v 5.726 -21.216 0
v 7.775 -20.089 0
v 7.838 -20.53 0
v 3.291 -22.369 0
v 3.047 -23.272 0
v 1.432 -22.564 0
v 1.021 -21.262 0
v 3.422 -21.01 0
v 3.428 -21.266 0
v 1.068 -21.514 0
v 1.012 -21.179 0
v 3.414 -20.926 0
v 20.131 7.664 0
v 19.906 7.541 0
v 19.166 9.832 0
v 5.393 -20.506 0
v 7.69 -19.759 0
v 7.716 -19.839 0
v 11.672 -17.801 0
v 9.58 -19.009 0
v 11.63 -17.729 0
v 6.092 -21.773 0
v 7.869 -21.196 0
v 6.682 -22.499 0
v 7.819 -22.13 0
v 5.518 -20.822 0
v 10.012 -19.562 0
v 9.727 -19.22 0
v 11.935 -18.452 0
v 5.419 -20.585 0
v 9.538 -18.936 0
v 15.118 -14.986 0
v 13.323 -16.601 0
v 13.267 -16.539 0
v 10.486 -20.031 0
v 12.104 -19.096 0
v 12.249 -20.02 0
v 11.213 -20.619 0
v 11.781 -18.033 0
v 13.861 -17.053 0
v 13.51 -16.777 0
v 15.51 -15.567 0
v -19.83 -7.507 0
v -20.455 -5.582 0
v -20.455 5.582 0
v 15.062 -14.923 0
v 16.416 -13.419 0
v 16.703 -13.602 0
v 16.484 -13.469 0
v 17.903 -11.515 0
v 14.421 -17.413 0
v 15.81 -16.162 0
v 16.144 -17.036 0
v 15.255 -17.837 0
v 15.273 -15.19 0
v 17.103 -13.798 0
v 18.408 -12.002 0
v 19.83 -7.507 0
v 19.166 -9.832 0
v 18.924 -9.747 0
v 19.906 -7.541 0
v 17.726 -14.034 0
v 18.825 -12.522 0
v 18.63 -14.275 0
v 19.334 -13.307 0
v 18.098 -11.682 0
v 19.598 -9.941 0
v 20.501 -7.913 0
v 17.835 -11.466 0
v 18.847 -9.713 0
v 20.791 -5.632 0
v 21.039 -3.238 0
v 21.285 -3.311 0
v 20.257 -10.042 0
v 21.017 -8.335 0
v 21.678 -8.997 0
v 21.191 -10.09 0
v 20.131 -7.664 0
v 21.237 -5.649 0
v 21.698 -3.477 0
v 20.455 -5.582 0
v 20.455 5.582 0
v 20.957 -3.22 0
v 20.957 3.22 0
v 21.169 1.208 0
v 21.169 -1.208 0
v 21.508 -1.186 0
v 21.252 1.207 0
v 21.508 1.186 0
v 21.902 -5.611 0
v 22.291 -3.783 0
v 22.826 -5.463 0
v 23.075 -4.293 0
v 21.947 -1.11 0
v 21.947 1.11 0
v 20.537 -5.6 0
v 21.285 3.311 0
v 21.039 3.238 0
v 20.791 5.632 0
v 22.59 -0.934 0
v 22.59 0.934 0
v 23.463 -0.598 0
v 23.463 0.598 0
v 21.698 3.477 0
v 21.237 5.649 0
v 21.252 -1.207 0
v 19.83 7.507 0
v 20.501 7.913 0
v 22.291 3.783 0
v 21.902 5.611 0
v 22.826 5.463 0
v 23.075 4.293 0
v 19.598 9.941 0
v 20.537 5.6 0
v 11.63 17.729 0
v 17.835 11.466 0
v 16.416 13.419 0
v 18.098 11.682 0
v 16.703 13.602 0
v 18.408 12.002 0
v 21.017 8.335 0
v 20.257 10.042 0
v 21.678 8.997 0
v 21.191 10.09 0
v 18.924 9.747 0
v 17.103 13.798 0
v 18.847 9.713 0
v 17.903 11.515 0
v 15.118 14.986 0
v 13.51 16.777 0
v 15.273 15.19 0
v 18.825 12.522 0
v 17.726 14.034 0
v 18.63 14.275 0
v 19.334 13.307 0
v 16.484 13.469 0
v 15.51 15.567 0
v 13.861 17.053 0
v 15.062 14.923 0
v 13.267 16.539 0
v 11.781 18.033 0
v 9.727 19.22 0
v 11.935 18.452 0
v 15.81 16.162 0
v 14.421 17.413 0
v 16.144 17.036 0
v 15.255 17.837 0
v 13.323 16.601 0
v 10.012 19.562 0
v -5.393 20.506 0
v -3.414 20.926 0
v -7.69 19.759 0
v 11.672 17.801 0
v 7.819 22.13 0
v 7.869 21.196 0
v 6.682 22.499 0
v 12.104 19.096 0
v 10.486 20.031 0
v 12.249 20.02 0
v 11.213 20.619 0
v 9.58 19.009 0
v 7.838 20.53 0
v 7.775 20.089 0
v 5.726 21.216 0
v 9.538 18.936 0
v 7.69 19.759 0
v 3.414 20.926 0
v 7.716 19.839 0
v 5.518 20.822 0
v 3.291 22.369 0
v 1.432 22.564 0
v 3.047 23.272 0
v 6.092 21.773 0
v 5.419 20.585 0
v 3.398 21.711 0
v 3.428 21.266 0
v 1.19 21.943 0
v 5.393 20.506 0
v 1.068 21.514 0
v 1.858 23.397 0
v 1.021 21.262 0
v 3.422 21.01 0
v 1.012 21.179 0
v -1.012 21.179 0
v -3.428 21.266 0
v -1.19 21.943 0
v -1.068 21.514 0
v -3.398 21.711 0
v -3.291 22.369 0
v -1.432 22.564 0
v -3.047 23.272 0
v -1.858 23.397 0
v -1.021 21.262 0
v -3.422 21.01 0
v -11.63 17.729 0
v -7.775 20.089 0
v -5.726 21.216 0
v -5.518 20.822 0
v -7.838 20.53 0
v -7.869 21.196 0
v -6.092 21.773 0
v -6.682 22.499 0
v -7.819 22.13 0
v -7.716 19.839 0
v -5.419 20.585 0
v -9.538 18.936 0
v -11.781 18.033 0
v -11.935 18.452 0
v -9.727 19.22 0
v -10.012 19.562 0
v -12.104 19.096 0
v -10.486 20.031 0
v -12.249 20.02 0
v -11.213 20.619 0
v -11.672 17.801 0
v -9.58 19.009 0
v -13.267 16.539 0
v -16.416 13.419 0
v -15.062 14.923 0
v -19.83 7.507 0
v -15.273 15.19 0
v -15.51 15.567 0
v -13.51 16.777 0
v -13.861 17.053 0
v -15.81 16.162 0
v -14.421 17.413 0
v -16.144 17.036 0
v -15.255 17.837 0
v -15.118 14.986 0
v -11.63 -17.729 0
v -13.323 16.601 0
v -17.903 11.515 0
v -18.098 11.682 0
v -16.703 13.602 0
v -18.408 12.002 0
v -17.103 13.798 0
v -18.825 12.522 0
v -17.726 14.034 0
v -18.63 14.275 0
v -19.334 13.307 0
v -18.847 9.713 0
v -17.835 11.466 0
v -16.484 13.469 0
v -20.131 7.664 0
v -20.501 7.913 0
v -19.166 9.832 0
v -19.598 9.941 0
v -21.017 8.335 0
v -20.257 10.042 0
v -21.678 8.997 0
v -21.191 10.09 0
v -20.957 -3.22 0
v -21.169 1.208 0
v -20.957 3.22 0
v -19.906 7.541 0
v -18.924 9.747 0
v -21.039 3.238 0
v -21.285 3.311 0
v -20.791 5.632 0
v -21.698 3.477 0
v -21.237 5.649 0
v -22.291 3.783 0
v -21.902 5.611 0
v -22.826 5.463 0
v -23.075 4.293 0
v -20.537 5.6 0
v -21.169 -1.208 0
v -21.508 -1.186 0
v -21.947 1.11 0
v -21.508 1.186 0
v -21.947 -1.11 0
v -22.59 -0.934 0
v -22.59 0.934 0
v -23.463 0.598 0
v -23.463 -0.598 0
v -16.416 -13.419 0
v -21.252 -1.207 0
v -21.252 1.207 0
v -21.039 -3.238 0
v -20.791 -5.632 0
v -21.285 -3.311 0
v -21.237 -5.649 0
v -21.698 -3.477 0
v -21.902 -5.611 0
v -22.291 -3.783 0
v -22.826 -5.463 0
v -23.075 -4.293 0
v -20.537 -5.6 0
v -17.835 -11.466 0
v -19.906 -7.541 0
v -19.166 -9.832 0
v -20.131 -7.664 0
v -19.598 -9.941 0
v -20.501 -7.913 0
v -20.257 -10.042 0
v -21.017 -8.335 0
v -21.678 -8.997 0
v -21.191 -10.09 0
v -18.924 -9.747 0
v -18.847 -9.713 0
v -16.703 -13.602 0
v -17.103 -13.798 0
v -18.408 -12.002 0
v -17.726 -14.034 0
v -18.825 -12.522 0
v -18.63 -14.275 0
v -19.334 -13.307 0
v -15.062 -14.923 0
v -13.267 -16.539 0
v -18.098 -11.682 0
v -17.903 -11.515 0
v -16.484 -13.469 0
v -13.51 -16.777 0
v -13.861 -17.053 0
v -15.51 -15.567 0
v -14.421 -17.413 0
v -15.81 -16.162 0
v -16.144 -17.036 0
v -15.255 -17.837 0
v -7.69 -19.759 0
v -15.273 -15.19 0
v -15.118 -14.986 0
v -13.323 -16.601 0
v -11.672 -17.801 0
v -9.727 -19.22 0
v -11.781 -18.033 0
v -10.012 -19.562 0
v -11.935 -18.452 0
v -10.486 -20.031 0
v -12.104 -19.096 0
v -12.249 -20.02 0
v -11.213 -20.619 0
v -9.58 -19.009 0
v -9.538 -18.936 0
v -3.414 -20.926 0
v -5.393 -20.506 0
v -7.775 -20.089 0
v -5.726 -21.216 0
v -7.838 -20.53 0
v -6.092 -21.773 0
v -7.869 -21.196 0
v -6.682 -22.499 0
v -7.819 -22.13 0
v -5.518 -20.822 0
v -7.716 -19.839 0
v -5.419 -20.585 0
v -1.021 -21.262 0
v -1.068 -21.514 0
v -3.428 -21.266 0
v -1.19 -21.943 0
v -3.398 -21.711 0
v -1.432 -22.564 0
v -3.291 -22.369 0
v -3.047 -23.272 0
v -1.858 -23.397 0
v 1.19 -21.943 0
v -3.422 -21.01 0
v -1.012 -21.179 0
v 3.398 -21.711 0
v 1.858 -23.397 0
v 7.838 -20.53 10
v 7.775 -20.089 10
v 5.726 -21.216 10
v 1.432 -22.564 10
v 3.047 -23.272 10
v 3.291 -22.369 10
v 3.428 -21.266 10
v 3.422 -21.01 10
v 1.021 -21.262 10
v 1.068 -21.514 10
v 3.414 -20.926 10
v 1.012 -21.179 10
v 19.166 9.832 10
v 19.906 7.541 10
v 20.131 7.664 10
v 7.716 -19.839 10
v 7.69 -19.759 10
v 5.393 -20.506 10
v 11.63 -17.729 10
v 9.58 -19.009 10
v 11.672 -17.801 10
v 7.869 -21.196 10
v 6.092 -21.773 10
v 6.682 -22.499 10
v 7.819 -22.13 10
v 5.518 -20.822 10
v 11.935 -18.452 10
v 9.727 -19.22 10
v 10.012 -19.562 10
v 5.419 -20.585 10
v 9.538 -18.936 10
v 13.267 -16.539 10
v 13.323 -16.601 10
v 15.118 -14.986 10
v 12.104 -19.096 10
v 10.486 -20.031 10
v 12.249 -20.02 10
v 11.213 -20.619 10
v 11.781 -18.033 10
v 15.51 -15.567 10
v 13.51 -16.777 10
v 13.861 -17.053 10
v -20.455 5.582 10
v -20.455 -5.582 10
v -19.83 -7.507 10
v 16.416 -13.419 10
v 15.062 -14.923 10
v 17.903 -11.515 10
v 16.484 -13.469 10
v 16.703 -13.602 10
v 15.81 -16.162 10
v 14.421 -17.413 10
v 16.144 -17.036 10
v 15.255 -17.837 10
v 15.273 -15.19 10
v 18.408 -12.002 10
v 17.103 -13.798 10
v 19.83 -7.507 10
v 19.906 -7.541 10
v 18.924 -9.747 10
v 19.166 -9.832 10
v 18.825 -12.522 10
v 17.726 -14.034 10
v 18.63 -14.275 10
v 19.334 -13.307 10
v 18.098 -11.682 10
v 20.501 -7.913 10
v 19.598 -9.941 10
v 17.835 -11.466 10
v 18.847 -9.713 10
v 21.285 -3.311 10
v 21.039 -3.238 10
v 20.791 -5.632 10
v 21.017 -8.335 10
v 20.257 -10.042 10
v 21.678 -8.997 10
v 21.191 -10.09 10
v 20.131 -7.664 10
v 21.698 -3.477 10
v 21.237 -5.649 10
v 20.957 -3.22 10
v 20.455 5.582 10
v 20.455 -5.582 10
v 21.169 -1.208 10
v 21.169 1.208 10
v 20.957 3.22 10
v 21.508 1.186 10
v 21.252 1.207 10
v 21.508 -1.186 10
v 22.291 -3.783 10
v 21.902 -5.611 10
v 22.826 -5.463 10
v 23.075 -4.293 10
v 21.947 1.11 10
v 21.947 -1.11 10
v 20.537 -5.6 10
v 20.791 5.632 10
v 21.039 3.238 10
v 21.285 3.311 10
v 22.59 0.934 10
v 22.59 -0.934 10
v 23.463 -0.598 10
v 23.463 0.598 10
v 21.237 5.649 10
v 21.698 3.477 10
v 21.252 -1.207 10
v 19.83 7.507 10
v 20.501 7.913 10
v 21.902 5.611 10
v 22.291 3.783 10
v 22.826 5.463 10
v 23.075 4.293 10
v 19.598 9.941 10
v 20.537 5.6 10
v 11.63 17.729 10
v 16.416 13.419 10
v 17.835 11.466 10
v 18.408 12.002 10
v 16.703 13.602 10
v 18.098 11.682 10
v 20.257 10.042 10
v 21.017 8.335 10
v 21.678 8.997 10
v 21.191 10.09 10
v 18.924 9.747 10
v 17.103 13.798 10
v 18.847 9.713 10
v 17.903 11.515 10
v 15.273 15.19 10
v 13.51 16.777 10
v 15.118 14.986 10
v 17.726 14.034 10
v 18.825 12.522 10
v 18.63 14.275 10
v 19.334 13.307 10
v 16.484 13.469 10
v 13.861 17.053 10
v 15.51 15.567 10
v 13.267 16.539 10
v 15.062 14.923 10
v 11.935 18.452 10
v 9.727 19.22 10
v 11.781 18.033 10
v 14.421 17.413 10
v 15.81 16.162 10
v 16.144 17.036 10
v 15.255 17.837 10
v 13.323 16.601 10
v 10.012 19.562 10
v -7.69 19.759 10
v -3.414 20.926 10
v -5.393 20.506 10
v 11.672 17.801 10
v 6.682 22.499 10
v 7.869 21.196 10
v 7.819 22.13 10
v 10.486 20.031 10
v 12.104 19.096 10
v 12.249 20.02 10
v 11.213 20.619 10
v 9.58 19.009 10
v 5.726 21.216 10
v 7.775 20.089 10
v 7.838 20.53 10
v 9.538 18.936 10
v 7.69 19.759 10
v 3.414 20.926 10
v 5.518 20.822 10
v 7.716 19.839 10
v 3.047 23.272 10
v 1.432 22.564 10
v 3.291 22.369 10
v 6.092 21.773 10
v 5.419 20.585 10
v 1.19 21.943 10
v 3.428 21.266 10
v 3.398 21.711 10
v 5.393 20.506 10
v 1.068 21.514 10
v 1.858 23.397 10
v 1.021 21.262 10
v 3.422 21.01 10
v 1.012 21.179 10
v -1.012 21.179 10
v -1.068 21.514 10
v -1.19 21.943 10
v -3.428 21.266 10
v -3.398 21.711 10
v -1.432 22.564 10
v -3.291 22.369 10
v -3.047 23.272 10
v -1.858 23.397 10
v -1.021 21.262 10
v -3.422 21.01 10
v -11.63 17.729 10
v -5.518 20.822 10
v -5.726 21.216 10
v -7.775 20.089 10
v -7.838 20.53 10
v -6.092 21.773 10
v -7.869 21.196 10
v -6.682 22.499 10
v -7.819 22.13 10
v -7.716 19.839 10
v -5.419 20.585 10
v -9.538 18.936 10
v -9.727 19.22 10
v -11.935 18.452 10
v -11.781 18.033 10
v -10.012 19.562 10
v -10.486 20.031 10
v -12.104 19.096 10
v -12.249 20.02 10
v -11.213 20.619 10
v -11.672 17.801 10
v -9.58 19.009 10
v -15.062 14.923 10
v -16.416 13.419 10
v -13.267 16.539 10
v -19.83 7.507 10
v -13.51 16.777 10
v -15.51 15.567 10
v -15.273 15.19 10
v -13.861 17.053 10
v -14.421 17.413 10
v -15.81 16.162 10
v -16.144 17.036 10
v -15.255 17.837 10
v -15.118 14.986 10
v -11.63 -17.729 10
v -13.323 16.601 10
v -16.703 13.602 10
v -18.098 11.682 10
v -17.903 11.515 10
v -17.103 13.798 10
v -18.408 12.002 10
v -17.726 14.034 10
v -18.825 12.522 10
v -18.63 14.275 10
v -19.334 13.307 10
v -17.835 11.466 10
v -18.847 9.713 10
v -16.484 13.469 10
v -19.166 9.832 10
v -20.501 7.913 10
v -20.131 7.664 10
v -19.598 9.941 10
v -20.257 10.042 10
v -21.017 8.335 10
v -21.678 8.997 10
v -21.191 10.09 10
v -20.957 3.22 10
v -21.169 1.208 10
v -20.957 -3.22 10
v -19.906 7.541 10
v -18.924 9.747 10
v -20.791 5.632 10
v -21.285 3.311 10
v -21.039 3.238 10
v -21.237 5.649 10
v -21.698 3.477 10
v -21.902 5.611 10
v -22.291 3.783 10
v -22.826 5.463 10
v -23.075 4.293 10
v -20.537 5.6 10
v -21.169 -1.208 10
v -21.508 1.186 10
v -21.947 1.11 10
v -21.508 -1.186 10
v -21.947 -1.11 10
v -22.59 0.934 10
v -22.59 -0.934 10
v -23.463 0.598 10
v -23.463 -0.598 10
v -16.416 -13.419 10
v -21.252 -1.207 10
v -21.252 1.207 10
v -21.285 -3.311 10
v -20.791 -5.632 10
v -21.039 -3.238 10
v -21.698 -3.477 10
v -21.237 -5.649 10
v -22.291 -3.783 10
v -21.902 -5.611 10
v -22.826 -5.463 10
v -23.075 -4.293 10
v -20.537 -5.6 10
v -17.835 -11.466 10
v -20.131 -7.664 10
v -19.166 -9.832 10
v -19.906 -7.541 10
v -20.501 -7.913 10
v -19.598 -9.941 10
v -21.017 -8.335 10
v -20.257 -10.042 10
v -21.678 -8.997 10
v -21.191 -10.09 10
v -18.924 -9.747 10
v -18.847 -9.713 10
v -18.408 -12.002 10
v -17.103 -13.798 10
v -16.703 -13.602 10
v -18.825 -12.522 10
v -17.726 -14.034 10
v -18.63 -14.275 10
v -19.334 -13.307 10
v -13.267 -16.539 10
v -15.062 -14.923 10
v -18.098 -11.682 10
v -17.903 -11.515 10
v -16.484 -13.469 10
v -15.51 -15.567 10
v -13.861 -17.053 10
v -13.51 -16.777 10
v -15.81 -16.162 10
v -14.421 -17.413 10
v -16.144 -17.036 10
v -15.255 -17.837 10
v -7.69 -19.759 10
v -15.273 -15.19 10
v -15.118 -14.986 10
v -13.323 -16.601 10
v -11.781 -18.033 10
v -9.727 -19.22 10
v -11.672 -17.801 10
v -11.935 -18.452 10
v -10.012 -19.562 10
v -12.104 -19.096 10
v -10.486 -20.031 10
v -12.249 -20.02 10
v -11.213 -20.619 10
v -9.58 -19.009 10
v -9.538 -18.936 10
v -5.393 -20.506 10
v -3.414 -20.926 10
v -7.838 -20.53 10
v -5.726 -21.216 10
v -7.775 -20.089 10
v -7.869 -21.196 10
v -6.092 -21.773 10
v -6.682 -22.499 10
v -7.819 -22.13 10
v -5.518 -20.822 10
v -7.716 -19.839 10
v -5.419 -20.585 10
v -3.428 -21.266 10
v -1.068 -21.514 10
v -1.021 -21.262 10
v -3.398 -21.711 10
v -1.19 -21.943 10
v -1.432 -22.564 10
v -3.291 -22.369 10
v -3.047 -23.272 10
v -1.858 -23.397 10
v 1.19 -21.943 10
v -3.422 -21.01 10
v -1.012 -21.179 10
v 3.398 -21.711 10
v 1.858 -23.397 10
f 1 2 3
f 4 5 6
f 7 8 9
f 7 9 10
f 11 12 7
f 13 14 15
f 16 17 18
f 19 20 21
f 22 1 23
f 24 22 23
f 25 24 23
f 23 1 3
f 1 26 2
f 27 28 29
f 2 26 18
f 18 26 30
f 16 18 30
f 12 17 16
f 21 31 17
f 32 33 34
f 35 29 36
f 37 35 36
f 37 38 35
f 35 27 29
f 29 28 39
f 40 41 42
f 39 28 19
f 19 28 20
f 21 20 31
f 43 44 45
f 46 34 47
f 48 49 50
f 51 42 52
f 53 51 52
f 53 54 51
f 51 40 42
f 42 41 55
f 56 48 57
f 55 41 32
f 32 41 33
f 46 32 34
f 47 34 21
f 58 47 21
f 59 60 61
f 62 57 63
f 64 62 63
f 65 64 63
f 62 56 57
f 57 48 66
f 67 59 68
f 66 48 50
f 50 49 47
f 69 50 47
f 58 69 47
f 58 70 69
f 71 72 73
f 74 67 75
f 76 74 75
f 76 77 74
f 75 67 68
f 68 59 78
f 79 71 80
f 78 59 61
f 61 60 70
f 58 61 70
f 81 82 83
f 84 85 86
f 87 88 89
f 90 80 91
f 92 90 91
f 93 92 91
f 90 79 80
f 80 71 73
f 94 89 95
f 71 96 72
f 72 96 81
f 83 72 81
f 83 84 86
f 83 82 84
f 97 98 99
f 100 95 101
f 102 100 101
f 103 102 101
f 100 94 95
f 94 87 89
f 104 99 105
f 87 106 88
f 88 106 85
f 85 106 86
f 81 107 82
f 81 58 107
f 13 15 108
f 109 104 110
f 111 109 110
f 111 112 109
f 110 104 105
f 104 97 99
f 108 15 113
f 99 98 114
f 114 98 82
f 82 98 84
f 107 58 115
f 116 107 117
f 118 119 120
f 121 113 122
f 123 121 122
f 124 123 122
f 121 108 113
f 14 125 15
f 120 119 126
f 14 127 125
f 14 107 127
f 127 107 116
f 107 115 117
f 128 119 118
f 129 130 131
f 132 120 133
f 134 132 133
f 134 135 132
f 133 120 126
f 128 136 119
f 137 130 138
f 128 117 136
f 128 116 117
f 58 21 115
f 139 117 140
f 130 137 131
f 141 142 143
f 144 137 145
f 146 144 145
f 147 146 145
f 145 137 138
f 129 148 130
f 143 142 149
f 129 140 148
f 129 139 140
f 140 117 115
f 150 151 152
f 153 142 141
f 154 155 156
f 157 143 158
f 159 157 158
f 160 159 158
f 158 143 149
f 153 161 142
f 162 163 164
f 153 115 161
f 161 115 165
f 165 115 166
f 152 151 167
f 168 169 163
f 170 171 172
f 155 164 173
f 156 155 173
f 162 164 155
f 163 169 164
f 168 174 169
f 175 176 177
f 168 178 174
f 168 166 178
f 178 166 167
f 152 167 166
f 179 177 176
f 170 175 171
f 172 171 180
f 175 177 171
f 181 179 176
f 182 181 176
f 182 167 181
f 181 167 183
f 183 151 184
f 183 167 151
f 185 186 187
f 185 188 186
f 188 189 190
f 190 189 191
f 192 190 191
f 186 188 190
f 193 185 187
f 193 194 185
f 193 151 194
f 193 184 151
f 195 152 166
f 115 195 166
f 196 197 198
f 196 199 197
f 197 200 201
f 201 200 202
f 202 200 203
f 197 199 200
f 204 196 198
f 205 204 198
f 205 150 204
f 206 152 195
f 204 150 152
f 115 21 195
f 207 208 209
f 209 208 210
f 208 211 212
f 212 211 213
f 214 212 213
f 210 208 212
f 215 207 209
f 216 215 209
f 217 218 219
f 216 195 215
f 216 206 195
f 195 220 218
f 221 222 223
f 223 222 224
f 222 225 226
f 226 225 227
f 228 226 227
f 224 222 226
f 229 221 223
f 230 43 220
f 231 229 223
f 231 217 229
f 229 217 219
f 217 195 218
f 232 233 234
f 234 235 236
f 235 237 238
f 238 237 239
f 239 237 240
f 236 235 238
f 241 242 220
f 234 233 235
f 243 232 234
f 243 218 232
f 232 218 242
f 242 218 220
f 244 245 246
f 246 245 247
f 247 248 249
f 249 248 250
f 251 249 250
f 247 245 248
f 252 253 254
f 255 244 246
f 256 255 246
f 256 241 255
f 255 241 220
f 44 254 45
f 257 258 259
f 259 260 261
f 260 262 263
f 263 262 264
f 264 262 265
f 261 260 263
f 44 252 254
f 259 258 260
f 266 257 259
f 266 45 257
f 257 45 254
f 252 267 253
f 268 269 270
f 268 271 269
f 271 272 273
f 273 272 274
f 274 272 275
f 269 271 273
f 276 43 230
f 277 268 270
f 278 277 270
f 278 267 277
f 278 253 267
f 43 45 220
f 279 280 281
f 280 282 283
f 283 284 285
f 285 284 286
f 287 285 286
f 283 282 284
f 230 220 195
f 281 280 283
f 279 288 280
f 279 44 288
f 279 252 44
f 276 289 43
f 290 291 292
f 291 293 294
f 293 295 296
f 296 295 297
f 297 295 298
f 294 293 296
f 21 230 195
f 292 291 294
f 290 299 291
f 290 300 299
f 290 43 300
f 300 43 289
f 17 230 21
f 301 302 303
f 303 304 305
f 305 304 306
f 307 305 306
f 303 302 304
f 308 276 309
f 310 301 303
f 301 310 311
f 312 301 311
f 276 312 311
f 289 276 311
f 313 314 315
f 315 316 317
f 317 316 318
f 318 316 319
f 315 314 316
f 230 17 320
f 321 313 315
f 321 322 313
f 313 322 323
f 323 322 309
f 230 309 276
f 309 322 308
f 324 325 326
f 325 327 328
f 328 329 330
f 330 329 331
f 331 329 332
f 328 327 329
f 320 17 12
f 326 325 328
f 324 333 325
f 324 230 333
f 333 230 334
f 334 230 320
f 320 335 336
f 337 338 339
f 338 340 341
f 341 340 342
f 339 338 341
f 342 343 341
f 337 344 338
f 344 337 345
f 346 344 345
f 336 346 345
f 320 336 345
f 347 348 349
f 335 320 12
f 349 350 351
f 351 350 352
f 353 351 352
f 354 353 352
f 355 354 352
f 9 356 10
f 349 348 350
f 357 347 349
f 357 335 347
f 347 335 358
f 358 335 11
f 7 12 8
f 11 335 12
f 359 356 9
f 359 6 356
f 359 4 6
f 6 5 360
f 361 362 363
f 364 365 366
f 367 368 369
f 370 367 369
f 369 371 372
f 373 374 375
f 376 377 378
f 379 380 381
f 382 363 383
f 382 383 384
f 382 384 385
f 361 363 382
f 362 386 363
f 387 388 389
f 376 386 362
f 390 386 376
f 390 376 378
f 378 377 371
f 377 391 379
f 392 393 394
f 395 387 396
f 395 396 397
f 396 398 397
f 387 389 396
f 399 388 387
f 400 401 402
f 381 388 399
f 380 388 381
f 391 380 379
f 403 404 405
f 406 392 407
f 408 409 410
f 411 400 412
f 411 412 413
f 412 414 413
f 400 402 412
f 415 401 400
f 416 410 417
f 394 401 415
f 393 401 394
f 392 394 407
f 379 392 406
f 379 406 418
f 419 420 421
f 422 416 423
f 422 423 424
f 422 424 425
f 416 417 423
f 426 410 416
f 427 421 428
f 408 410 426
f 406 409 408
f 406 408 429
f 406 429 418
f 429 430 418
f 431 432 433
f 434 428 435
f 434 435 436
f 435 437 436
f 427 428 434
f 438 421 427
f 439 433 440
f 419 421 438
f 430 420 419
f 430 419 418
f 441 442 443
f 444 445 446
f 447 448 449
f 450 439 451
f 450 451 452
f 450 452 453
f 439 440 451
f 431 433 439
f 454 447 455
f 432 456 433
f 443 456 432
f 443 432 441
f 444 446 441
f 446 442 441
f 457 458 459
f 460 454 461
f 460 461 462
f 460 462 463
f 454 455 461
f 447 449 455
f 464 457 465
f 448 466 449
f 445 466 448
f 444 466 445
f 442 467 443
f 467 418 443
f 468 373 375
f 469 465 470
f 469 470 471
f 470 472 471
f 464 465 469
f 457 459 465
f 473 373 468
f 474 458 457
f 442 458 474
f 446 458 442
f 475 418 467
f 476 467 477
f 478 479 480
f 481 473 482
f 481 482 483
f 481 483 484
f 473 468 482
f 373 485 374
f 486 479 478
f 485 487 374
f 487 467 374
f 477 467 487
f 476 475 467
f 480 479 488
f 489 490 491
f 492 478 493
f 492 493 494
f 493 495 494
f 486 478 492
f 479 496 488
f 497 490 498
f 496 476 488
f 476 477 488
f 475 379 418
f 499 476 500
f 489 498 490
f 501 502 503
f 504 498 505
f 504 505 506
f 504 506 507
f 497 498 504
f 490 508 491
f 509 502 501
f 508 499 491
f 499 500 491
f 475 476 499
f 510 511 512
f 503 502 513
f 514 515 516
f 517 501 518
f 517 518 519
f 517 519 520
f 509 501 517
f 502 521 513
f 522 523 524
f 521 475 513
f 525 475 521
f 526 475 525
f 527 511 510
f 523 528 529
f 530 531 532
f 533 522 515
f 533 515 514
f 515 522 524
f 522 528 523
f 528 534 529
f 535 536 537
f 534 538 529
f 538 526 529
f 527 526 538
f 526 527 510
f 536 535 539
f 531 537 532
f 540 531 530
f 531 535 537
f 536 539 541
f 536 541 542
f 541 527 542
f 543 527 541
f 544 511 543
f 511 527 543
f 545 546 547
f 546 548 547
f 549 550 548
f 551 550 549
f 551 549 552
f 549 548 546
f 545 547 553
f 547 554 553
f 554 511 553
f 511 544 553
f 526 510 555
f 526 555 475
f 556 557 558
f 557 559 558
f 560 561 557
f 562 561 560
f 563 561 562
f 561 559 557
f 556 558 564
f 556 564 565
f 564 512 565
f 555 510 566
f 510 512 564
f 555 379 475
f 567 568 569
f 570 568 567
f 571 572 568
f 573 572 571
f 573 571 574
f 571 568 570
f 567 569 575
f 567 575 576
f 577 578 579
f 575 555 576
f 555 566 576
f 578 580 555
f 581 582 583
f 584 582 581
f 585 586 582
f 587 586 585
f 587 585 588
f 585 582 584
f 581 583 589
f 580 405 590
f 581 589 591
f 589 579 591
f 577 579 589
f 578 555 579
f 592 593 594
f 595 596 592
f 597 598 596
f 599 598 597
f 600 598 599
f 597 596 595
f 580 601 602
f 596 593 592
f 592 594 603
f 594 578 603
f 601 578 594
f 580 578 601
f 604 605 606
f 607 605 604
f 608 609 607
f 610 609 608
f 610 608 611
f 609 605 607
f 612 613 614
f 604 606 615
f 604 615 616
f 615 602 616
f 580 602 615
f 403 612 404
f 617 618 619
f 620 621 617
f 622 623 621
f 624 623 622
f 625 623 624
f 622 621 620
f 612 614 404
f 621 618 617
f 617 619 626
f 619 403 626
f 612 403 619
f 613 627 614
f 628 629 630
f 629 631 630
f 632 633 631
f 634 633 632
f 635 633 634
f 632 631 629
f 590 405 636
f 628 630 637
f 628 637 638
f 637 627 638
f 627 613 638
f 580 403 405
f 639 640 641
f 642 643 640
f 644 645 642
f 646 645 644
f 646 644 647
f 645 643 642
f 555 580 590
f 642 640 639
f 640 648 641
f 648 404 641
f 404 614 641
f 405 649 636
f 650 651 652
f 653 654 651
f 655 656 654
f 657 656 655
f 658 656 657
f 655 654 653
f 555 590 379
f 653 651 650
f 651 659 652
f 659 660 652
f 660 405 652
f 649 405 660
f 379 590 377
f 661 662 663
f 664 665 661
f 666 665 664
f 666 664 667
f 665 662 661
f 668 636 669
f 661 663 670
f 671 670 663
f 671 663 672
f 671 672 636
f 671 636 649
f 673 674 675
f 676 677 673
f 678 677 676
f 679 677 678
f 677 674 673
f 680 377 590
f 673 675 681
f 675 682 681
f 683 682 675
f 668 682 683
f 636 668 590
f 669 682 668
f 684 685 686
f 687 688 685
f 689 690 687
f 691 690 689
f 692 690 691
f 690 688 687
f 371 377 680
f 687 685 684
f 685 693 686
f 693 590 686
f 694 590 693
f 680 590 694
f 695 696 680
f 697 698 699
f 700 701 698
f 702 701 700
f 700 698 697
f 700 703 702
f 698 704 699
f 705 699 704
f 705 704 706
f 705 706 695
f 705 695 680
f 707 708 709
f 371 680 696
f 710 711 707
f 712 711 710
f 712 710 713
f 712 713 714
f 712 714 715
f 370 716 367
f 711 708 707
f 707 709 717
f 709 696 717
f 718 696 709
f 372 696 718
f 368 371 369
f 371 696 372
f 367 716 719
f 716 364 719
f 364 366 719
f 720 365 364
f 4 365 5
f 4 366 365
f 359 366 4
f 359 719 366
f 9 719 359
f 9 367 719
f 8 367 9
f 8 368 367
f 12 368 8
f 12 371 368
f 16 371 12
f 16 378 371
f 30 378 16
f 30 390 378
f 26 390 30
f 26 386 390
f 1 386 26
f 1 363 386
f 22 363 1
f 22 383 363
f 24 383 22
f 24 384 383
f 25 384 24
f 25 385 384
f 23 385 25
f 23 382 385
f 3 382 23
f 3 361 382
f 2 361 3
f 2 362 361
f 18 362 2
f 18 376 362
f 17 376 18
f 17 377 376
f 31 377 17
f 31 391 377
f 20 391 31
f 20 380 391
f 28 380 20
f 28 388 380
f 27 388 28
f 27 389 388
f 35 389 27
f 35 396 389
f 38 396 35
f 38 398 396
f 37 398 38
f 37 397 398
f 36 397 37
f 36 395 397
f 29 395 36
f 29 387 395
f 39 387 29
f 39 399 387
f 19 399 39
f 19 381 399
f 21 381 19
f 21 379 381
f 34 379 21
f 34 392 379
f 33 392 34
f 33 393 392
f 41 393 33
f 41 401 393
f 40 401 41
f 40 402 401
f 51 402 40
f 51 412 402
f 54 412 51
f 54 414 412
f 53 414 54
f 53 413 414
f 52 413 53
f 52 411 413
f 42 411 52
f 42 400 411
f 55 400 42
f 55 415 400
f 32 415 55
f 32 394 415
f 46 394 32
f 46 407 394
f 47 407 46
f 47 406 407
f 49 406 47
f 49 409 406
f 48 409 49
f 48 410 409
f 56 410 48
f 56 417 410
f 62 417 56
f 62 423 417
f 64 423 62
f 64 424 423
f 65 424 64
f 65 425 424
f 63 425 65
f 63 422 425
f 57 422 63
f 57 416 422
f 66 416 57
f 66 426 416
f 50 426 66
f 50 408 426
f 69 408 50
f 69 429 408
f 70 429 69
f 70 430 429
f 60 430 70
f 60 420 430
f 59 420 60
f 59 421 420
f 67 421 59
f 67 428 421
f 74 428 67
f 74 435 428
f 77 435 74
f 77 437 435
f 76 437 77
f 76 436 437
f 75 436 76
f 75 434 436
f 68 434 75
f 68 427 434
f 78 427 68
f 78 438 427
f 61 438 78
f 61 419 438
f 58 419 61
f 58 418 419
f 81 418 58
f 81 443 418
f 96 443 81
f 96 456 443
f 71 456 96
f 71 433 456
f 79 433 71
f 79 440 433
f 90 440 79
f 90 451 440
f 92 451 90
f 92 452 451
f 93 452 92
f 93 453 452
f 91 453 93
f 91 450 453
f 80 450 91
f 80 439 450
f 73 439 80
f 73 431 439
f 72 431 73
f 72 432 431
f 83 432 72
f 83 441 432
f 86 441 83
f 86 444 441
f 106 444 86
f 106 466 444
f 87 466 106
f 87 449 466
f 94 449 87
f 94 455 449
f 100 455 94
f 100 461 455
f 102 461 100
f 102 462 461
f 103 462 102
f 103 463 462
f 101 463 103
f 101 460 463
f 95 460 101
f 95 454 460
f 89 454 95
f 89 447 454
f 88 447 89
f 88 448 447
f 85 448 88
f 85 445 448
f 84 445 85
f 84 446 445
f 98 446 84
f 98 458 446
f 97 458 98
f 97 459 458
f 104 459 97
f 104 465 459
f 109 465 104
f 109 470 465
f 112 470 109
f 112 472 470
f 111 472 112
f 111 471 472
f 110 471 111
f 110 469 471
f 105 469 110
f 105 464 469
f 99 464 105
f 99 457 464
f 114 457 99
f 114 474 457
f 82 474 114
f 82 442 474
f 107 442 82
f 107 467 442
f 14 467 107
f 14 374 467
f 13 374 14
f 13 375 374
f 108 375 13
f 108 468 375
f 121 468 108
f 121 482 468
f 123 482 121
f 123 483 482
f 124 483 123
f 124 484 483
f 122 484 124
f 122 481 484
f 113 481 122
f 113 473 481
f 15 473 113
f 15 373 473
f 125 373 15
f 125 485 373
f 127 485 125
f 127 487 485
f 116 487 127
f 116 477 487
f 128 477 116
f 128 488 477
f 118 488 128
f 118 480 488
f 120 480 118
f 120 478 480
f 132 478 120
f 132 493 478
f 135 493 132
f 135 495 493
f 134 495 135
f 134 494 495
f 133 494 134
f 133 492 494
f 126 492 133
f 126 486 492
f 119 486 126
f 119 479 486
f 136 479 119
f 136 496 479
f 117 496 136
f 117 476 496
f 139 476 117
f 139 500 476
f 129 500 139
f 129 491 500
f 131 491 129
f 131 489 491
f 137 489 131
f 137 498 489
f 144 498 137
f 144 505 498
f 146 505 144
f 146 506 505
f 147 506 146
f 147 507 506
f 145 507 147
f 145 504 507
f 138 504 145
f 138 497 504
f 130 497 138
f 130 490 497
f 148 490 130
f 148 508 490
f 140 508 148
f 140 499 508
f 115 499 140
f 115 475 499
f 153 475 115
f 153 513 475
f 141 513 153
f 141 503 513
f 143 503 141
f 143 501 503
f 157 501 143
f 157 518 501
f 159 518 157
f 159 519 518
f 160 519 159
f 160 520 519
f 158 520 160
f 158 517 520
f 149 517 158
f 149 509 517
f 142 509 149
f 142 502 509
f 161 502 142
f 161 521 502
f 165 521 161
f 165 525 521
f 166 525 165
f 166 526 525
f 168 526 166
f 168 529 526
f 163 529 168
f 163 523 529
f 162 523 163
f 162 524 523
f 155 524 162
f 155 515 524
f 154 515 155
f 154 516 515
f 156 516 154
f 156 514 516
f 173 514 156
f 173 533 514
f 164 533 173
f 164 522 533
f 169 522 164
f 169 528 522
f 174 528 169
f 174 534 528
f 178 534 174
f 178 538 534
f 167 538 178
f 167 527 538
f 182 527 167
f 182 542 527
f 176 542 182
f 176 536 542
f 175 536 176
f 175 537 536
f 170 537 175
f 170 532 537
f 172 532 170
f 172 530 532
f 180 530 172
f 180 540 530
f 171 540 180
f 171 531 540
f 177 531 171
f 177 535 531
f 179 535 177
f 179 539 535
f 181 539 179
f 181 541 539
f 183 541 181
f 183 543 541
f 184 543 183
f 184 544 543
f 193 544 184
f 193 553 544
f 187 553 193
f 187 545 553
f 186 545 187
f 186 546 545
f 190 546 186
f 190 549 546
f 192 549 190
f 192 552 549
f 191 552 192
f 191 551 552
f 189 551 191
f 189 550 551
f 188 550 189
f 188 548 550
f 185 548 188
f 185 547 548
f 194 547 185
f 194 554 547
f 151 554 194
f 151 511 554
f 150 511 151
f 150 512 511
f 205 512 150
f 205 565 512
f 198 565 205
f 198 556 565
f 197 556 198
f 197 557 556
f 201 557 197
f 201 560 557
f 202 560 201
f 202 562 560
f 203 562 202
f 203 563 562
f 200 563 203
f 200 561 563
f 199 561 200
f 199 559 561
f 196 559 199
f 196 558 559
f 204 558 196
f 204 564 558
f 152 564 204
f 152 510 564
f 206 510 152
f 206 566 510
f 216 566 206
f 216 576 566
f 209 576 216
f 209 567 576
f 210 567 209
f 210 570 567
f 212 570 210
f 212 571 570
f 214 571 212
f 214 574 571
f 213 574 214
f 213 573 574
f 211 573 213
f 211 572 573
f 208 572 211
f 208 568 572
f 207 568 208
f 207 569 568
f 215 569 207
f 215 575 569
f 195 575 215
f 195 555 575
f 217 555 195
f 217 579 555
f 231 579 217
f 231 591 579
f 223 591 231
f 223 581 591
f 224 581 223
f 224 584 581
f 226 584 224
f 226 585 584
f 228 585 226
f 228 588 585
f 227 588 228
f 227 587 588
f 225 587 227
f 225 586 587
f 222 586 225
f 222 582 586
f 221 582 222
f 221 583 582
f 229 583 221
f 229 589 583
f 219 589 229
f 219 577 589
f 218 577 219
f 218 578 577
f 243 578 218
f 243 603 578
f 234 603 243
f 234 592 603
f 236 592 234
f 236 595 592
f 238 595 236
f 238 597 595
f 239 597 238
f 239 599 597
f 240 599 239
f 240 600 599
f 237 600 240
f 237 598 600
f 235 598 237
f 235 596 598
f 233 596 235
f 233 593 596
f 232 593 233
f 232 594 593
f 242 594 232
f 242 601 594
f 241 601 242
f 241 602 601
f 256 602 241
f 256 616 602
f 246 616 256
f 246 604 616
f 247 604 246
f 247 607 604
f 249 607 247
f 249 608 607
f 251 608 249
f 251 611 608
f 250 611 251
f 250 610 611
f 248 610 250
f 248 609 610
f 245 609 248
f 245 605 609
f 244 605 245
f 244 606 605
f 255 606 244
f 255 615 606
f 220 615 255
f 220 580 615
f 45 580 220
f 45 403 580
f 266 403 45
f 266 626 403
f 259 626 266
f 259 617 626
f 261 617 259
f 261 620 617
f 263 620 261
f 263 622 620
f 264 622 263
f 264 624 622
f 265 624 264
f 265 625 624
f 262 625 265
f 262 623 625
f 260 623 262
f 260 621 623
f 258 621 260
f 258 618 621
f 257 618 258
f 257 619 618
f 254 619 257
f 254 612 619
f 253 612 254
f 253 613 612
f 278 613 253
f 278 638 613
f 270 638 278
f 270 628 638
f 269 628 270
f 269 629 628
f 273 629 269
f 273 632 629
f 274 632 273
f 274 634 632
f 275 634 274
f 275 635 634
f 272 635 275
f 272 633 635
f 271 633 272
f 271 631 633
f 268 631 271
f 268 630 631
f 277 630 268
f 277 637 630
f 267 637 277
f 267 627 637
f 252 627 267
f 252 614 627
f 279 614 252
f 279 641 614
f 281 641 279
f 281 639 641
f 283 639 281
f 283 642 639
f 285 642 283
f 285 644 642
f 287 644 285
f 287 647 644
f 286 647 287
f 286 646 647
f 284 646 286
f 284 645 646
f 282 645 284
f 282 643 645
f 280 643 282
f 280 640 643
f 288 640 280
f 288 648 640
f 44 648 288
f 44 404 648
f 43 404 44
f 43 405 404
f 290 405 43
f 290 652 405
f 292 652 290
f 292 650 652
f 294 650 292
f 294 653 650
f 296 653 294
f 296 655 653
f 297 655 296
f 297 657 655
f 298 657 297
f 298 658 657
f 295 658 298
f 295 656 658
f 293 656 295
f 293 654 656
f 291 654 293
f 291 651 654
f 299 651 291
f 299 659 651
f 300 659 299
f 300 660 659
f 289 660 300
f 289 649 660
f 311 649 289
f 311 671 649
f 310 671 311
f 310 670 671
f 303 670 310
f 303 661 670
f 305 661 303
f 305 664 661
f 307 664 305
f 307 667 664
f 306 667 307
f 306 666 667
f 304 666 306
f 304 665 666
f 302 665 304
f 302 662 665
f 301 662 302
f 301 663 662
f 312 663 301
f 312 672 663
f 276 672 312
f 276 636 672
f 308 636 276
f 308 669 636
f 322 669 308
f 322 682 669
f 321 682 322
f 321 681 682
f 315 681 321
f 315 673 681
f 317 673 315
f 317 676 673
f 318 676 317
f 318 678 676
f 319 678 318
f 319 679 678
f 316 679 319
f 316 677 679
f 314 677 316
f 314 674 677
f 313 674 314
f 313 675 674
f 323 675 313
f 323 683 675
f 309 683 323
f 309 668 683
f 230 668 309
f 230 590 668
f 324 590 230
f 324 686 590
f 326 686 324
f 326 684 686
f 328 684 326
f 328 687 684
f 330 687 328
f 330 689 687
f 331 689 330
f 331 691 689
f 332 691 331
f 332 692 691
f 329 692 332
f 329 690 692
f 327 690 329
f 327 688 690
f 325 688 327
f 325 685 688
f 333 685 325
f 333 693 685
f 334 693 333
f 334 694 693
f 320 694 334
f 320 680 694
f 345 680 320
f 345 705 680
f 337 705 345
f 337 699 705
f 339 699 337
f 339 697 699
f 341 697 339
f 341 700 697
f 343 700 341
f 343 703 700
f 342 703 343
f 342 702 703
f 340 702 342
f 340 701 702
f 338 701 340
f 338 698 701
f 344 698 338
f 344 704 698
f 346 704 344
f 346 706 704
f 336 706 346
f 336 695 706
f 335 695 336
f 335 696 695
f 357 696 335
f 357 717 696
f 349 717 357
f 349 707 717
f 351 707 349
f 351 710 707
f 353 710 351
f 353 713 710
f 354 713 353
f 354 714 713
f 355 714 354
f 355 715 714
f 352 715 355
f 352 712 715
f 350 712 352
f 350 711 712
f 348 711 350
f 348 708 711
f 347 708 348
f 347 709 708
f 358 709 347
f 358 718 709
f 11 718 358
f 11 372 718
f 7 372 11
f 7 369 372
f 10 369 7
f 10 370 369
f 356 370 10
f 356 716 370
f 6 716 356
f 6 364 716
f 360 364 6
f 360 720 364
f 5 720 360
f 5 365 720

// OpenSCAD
// Simple involute gear library
// RehelixK 2017

/* [ Global ] */

// Diameter of gear (mm) - specify pitch or diameter not both
d=0;

// Pitch (per inch diameter, i.e. 1 inch diameter would hahelixe this many teeth)
p=0;

// Number of teeth
n=30;

// Example 2nd gear teeth
n2=0;

// Example 3rd gear teeth
n3=0;

// Example 4th gear teeth
n4=0;

// Gear height (mm)
h=10;

// Helix
helix=0; // [-3,-2,-1,0,1,2,3]

// Chamfer edges
chamfer=0; // [0,1]

// Spindle radius
spindle=0;

// Diameter of hole
hole=0;

// Width (wrench size) of nut
nut=0;

// Spokes
spokes=0;

// Hollow out
hollow=0; // [0,1]

/* [ Tweaks ] */

// Wall (for spokes, hollow, etc)
wall=2;

// Dedendum (mm) - half height of teeth (0 for based on pitch)
b=0;

// Tolerance for print clearances (mm)
t=0.15;

// steps for each side of tooth - more for smoother
s=5;

// Circular parts steps
fn=100;

gear_example(n1=n,n2=n2,n3=n3,n4=n4,d=d,p=p,b=b,s=s,t=t,h=h,helix=helix,chamfer=chamfer,spindle=spindle,hole=hole,nut=nut,spokes=spokes,hollow=hollow,wall=wall,fn=fn);

//translate([-gear_diameter(39,17)/2,0,0])gear_chamfer(n=39,p=17,h=10,m=3);
//translate([gear_diameter(11,17)/2,0,0])rotate([180,0,0])translate([0,0,-10])gear_chamfer(n=11,p=17,h=10,m=3);

function gear_diameter(n,p)=25.4*n/p;
function gear_pitch(n,d)=25.4*n/d/PI;
function gear_per_inch(p)=25.4/p;

function rad(a)=a*PI*2/360;
function deg(a)=a*360/PI/2;
function polar(r,a)=[r*cos(a),r*sin(a)];

module gear_involute(n=30,   // Number of teeth
                d=0,        // Diameter (centre of teeth) specify diameter or pitch, not both
                p=0,        // Pitch in teeth per inch diameter 
                b=0,        // Dedendum (0 sets based on p)
                s=5,        // steps on each side of each tooth
                t=0.1,      // tollerance
                )
{ // Note max X axis is centre of one of the teeth
    // Defaults
    s=max(s,3);
    p=(d?25.4*n/d:p?p:17); // If diameter, work out pitch
    d=(p?25.4*n/p:d); // If pitch, work out diameter
    b=(b?b:18/p);  // Default b based on pitch
    r=d/2-b; // min radius
    pa=360/n; // pitch angle
    ta=360*t/(r*PI*2); // tolerance angle
    pm=acos((r+b-t)/(r+b*2)); // middle of involute
    da=deg(tan(pm))-pm+pa/4-ta; // angle to make spacing right
    pt=acos((r-t)/(r+b*2)); // top of involute
    ps=pt/s; // step for involute each side    
    points=[
     for(q=[0:1:n-1])
      for(e=[0:1:1])
         for(a=[e?-s:0:1:e?0:s])
             polar((r-t)/cos(a*ps),q*pa+deg(tan(a*ps))-a*ps+(e?da:-da))
    ];
    polygon(points=points);    
}

// Modules to use the gear_involute 2D shape to make useful 3D objects

module gear(n=30,   // Number of teeth
            d=0,    // Diameter (use this or pitch, not both)
            p=0,    // Pitch (per inch diameter)
            b=0,    // Dedendum (0 sets based on p)
            s=5,    // Steps to make side of teeth
            t=0.1,  // Tolerance
            h=10,   // Height
            helix=0,    // helix (1) or herringbone (2), -ve for other direction
            chamfer=false,  // Chamfer edges
            hollow=false,   // Hollow out, leahelixing a base
            spokes=0,   // Add spokes
            spindle=0,  // Set radius of spindle in the middle
            hole=0, // Diameter of hole
            nut=0,  // Diameter of nut
            wall=1, // Wall size
            fn=0,  // $fn for spindle/hole/etc
            )
{
    fn=(fn?fn:$fn?$fn:50);
    p=(d?25.4*n/d:p?p:17); // If diameter, work out pitch
    d=(p?25.4*n/p:d); // If pitch, work out diameter
    b=(b?b:18/p);  // Default b based on pitch
    hub=max(hole/2,spindle?spindle+h/3:0,nut/2/cos(30),d/10)+wall;
    difference()
    {
        if(helix)union()
        {
            q=abs(helix);
            a=sign(helix)*360*h/(d*PI)/q;
            for(l=[0:1:q-1])
                translate([0,0,l*h/q])
                rotate([0,0,((l%2)?1:-1)*a/2])
                linear_extrude(height=h/q,twist=((l%2)?1:-1)*a)
                gear_involute(n=n,d=d,p=p,b=b,s=s,t=t);
        }
        else
            linear_extrude(height=h)gear_involute(n=n,d=d,p=p,b=b,s=s,t=t);
        if(chamfer)difference()
        {
            translate([-d,-d,-1])cube([d*2,d*2,b*2+1]);
            cylinder(r1=d/2-b,r2=d/2+b,h=b*2,$fn=fn);
        }
        if(chamfer)difference()
        {
            translate([-d,-d,h-b*2])cube([d*2,d*2,b*2+1]);
            translate([0,0,h-b*2])cylinder(r2=d/2-b,r1=d/2+b,h=b*2,$fn=fn);
        }
        if(spindle)gear_spindle(h=h,m=spindle,r=d/2-b-1,t=t,fn=fn);
        if(hole && ! spindle)translate([0,0,-1])cylinder(r=hole/2+t,h=h+2,$fn=fn);
        if(nut && ! spindle)translate([0,0,h-h/6])cylinder(r=nut/2/cos(30)+t,h=h/6+1,$fn=6);
        if(spokes || hollow)translate([0,0,hollow?wall:-1])difference()
        {
            cylinder(r=d/2-b-wall-t,h=h+2,$fn=fn);
            if(spokes || hole || nut || spindle)cylinder(r=hub,h=h+2,$fn=fn);
            if(spokes)for(a=[0:1:spokes-1])
            rotate([0,0,360/spokes*a])
            translate([-wall/2,0,0])
            cube([wall,d/2,h+2]);
        }
    }
    if(spindle)difference()
    {
        gear_spindle(h=h,m=spindle,r=d/2-b-1,t=-t,fn=fn);
        if(hole)translate([0,0,-1])cylinder(r=hole/2+t,h=h+2,$fn=fn);
        if(nut)translate([0,0,h-h/6])cylinder(r=nut/2/cos(30)+t,h=h/6+1,$fn=6);
    }
 
}

module gear_spindle(h=0,m=0,t=0,fn=50,r=0,fn=0)
{ // Simple spindle in middle of gear
    fn=(fn?fn:$fn?$fn:50);
    q=(r?min((h-2)/3,r-m):(h-2)/3); // extra width
    t2=t/sqrt(2);
    cylinder(r=m+t,h=h,$fn=fn);
    hull()
    {
        translate([0,0,t>0?-t2:0])cylinder(r=m+q+t2-(t>0?0:1),h=1,$fn=fn);
        translate([0,0,1+t])cylinder(r1=m+q+t2,r2=m+t2,h=q,$fn=fn);
    }
    hull()
    {
        translate([0,0,h-q-1-t])cylinder(r2=m+q+t2,r1=m+t2,h=q,$fn=fn);
        translate([0,0,h-1+(t>0?t2:0)])cylinder(r=m+q+t2-(t>0?0:1),h=1,$fn=fn);
    }
}

module gear_join(n=30,n2=20,d=0,p=0,b=0,s=5,t=0.1,h=10,m=5,f=0,helix=0,chamfer=1,spindle=5,hole=0,nut=0,spokes=0,hollow=0,wall=1,fn=0)
{ // Make a gear and a bridge to next gear (+ x axis) - for example
    fn=(fn?fn:$fn?$fn:50);
    p=(p?p:17);
    r1=gear_diameter(n,p)/2;
    r2=gear_diameter(n2,p)/2;
    gear(n=n,d=d,p=p,b=b,s=s,t=t,h=h,chamfer=true,spindle=m,helix=helix,chamfer=chamfer,spindle=spindle,hole=hole,nut=nut,spokes=spokes,hollow=hollow,wall=wall,fn=fn);
    if(n2)
    {
        hull()
        {
            translate([0,0,h-1])cylinder(r=m,h=1);
            translate([h,0,h*2])sphere(m);
        }
        hull()
        {
            translate([h,0,h*2])sphere(m);
            translate([r1+r2-h,0,h*2])sphere(m);
        }
        hull()
        {
            translate([r1+r2,0,h-1])cylinder(r=m,h=1);
            translate([r1+r2-h,0,h*2])sphere(m);
        }
    }
}


// Example of joined gears
module gear_example(n1=0,n2=0,n3=0,n4=0,h=10,p=17,d=0,t=0.1,helix=1,chamfer=1,spindle=5,hole=0,nut=0,spokes=0,hollow=0,wall=1,fn=0)
{
    fn=(fn?fn:$fn?$fn:50);
    p=(p?p:17);
    spindle=(spindle?spindle:n2?5:0); // spindle if joining gears
    nut=(n2?0:nut); // No nut if joining gears
    hole=(n2?0:hole); // No hole if joinging gears
    // Centre of one of the teeth is max X
    gear_join(n=n1,n2=n2,d=d,b=b,p=p,h=h,t=t,helix=helix,chamfer=chamfer,spindle=spindle,hole=hole,nut=nut,spokes=spokes,hollow=hollow,wall=wall,fn=fn);
    if(n2)
    {
        translate([(gear_diameter(n1,p)+gear_diameter(n2,p))/2,0,0])
        rotate([0,0,360/n2*round(n2/6)+((n2%2)?0:180/n2)]) 
        {
            gear_join(n=n2,n2=n3,d=d,b=b,p=p,h=h,t=t,helix=-helix,chamfer=chamfer,spindle=spindle,hole=hole,nut=nut,spokes=spokes,hollow=hollow,wall=wall,fn=fn);
            if(n3)
            {
                 translate([(gear_diameter(n2,p)+gear_diameter(n3,p))/2,0,0])
                 rotate([0,0,-360/n3*round(n3/6)+((n3%2)?0:180/n3)]) // align teeth
                 {
                     gear_join(n=n3,n2=n4,d=d,b=b,p=p,h=h,t=t,helix=helix,chamfer=chamfer,spindle=spindle,hole=hole,nut=nut,spokes=spokes,hollow=hollow,wall=wall,fn=fn);
                     if(n4)
                     {
                        translate([(gear_diameter(n3,p)+gear_diameter(n4,p))/2,0,0])
                        rotate([0,0,(n4%2)?0:180/n4]) // align teeth
                        gear(n=n4,d=d,p=p,b=b,h=h,t=t,helix=-helix,chamfer=chamfer,spindle=spindle,hole=hole,nut=nut,spokes=spokes,hollow=hollow,wall=wall,fn=fn);
                     }
                 }
             }
         }
    }
}
